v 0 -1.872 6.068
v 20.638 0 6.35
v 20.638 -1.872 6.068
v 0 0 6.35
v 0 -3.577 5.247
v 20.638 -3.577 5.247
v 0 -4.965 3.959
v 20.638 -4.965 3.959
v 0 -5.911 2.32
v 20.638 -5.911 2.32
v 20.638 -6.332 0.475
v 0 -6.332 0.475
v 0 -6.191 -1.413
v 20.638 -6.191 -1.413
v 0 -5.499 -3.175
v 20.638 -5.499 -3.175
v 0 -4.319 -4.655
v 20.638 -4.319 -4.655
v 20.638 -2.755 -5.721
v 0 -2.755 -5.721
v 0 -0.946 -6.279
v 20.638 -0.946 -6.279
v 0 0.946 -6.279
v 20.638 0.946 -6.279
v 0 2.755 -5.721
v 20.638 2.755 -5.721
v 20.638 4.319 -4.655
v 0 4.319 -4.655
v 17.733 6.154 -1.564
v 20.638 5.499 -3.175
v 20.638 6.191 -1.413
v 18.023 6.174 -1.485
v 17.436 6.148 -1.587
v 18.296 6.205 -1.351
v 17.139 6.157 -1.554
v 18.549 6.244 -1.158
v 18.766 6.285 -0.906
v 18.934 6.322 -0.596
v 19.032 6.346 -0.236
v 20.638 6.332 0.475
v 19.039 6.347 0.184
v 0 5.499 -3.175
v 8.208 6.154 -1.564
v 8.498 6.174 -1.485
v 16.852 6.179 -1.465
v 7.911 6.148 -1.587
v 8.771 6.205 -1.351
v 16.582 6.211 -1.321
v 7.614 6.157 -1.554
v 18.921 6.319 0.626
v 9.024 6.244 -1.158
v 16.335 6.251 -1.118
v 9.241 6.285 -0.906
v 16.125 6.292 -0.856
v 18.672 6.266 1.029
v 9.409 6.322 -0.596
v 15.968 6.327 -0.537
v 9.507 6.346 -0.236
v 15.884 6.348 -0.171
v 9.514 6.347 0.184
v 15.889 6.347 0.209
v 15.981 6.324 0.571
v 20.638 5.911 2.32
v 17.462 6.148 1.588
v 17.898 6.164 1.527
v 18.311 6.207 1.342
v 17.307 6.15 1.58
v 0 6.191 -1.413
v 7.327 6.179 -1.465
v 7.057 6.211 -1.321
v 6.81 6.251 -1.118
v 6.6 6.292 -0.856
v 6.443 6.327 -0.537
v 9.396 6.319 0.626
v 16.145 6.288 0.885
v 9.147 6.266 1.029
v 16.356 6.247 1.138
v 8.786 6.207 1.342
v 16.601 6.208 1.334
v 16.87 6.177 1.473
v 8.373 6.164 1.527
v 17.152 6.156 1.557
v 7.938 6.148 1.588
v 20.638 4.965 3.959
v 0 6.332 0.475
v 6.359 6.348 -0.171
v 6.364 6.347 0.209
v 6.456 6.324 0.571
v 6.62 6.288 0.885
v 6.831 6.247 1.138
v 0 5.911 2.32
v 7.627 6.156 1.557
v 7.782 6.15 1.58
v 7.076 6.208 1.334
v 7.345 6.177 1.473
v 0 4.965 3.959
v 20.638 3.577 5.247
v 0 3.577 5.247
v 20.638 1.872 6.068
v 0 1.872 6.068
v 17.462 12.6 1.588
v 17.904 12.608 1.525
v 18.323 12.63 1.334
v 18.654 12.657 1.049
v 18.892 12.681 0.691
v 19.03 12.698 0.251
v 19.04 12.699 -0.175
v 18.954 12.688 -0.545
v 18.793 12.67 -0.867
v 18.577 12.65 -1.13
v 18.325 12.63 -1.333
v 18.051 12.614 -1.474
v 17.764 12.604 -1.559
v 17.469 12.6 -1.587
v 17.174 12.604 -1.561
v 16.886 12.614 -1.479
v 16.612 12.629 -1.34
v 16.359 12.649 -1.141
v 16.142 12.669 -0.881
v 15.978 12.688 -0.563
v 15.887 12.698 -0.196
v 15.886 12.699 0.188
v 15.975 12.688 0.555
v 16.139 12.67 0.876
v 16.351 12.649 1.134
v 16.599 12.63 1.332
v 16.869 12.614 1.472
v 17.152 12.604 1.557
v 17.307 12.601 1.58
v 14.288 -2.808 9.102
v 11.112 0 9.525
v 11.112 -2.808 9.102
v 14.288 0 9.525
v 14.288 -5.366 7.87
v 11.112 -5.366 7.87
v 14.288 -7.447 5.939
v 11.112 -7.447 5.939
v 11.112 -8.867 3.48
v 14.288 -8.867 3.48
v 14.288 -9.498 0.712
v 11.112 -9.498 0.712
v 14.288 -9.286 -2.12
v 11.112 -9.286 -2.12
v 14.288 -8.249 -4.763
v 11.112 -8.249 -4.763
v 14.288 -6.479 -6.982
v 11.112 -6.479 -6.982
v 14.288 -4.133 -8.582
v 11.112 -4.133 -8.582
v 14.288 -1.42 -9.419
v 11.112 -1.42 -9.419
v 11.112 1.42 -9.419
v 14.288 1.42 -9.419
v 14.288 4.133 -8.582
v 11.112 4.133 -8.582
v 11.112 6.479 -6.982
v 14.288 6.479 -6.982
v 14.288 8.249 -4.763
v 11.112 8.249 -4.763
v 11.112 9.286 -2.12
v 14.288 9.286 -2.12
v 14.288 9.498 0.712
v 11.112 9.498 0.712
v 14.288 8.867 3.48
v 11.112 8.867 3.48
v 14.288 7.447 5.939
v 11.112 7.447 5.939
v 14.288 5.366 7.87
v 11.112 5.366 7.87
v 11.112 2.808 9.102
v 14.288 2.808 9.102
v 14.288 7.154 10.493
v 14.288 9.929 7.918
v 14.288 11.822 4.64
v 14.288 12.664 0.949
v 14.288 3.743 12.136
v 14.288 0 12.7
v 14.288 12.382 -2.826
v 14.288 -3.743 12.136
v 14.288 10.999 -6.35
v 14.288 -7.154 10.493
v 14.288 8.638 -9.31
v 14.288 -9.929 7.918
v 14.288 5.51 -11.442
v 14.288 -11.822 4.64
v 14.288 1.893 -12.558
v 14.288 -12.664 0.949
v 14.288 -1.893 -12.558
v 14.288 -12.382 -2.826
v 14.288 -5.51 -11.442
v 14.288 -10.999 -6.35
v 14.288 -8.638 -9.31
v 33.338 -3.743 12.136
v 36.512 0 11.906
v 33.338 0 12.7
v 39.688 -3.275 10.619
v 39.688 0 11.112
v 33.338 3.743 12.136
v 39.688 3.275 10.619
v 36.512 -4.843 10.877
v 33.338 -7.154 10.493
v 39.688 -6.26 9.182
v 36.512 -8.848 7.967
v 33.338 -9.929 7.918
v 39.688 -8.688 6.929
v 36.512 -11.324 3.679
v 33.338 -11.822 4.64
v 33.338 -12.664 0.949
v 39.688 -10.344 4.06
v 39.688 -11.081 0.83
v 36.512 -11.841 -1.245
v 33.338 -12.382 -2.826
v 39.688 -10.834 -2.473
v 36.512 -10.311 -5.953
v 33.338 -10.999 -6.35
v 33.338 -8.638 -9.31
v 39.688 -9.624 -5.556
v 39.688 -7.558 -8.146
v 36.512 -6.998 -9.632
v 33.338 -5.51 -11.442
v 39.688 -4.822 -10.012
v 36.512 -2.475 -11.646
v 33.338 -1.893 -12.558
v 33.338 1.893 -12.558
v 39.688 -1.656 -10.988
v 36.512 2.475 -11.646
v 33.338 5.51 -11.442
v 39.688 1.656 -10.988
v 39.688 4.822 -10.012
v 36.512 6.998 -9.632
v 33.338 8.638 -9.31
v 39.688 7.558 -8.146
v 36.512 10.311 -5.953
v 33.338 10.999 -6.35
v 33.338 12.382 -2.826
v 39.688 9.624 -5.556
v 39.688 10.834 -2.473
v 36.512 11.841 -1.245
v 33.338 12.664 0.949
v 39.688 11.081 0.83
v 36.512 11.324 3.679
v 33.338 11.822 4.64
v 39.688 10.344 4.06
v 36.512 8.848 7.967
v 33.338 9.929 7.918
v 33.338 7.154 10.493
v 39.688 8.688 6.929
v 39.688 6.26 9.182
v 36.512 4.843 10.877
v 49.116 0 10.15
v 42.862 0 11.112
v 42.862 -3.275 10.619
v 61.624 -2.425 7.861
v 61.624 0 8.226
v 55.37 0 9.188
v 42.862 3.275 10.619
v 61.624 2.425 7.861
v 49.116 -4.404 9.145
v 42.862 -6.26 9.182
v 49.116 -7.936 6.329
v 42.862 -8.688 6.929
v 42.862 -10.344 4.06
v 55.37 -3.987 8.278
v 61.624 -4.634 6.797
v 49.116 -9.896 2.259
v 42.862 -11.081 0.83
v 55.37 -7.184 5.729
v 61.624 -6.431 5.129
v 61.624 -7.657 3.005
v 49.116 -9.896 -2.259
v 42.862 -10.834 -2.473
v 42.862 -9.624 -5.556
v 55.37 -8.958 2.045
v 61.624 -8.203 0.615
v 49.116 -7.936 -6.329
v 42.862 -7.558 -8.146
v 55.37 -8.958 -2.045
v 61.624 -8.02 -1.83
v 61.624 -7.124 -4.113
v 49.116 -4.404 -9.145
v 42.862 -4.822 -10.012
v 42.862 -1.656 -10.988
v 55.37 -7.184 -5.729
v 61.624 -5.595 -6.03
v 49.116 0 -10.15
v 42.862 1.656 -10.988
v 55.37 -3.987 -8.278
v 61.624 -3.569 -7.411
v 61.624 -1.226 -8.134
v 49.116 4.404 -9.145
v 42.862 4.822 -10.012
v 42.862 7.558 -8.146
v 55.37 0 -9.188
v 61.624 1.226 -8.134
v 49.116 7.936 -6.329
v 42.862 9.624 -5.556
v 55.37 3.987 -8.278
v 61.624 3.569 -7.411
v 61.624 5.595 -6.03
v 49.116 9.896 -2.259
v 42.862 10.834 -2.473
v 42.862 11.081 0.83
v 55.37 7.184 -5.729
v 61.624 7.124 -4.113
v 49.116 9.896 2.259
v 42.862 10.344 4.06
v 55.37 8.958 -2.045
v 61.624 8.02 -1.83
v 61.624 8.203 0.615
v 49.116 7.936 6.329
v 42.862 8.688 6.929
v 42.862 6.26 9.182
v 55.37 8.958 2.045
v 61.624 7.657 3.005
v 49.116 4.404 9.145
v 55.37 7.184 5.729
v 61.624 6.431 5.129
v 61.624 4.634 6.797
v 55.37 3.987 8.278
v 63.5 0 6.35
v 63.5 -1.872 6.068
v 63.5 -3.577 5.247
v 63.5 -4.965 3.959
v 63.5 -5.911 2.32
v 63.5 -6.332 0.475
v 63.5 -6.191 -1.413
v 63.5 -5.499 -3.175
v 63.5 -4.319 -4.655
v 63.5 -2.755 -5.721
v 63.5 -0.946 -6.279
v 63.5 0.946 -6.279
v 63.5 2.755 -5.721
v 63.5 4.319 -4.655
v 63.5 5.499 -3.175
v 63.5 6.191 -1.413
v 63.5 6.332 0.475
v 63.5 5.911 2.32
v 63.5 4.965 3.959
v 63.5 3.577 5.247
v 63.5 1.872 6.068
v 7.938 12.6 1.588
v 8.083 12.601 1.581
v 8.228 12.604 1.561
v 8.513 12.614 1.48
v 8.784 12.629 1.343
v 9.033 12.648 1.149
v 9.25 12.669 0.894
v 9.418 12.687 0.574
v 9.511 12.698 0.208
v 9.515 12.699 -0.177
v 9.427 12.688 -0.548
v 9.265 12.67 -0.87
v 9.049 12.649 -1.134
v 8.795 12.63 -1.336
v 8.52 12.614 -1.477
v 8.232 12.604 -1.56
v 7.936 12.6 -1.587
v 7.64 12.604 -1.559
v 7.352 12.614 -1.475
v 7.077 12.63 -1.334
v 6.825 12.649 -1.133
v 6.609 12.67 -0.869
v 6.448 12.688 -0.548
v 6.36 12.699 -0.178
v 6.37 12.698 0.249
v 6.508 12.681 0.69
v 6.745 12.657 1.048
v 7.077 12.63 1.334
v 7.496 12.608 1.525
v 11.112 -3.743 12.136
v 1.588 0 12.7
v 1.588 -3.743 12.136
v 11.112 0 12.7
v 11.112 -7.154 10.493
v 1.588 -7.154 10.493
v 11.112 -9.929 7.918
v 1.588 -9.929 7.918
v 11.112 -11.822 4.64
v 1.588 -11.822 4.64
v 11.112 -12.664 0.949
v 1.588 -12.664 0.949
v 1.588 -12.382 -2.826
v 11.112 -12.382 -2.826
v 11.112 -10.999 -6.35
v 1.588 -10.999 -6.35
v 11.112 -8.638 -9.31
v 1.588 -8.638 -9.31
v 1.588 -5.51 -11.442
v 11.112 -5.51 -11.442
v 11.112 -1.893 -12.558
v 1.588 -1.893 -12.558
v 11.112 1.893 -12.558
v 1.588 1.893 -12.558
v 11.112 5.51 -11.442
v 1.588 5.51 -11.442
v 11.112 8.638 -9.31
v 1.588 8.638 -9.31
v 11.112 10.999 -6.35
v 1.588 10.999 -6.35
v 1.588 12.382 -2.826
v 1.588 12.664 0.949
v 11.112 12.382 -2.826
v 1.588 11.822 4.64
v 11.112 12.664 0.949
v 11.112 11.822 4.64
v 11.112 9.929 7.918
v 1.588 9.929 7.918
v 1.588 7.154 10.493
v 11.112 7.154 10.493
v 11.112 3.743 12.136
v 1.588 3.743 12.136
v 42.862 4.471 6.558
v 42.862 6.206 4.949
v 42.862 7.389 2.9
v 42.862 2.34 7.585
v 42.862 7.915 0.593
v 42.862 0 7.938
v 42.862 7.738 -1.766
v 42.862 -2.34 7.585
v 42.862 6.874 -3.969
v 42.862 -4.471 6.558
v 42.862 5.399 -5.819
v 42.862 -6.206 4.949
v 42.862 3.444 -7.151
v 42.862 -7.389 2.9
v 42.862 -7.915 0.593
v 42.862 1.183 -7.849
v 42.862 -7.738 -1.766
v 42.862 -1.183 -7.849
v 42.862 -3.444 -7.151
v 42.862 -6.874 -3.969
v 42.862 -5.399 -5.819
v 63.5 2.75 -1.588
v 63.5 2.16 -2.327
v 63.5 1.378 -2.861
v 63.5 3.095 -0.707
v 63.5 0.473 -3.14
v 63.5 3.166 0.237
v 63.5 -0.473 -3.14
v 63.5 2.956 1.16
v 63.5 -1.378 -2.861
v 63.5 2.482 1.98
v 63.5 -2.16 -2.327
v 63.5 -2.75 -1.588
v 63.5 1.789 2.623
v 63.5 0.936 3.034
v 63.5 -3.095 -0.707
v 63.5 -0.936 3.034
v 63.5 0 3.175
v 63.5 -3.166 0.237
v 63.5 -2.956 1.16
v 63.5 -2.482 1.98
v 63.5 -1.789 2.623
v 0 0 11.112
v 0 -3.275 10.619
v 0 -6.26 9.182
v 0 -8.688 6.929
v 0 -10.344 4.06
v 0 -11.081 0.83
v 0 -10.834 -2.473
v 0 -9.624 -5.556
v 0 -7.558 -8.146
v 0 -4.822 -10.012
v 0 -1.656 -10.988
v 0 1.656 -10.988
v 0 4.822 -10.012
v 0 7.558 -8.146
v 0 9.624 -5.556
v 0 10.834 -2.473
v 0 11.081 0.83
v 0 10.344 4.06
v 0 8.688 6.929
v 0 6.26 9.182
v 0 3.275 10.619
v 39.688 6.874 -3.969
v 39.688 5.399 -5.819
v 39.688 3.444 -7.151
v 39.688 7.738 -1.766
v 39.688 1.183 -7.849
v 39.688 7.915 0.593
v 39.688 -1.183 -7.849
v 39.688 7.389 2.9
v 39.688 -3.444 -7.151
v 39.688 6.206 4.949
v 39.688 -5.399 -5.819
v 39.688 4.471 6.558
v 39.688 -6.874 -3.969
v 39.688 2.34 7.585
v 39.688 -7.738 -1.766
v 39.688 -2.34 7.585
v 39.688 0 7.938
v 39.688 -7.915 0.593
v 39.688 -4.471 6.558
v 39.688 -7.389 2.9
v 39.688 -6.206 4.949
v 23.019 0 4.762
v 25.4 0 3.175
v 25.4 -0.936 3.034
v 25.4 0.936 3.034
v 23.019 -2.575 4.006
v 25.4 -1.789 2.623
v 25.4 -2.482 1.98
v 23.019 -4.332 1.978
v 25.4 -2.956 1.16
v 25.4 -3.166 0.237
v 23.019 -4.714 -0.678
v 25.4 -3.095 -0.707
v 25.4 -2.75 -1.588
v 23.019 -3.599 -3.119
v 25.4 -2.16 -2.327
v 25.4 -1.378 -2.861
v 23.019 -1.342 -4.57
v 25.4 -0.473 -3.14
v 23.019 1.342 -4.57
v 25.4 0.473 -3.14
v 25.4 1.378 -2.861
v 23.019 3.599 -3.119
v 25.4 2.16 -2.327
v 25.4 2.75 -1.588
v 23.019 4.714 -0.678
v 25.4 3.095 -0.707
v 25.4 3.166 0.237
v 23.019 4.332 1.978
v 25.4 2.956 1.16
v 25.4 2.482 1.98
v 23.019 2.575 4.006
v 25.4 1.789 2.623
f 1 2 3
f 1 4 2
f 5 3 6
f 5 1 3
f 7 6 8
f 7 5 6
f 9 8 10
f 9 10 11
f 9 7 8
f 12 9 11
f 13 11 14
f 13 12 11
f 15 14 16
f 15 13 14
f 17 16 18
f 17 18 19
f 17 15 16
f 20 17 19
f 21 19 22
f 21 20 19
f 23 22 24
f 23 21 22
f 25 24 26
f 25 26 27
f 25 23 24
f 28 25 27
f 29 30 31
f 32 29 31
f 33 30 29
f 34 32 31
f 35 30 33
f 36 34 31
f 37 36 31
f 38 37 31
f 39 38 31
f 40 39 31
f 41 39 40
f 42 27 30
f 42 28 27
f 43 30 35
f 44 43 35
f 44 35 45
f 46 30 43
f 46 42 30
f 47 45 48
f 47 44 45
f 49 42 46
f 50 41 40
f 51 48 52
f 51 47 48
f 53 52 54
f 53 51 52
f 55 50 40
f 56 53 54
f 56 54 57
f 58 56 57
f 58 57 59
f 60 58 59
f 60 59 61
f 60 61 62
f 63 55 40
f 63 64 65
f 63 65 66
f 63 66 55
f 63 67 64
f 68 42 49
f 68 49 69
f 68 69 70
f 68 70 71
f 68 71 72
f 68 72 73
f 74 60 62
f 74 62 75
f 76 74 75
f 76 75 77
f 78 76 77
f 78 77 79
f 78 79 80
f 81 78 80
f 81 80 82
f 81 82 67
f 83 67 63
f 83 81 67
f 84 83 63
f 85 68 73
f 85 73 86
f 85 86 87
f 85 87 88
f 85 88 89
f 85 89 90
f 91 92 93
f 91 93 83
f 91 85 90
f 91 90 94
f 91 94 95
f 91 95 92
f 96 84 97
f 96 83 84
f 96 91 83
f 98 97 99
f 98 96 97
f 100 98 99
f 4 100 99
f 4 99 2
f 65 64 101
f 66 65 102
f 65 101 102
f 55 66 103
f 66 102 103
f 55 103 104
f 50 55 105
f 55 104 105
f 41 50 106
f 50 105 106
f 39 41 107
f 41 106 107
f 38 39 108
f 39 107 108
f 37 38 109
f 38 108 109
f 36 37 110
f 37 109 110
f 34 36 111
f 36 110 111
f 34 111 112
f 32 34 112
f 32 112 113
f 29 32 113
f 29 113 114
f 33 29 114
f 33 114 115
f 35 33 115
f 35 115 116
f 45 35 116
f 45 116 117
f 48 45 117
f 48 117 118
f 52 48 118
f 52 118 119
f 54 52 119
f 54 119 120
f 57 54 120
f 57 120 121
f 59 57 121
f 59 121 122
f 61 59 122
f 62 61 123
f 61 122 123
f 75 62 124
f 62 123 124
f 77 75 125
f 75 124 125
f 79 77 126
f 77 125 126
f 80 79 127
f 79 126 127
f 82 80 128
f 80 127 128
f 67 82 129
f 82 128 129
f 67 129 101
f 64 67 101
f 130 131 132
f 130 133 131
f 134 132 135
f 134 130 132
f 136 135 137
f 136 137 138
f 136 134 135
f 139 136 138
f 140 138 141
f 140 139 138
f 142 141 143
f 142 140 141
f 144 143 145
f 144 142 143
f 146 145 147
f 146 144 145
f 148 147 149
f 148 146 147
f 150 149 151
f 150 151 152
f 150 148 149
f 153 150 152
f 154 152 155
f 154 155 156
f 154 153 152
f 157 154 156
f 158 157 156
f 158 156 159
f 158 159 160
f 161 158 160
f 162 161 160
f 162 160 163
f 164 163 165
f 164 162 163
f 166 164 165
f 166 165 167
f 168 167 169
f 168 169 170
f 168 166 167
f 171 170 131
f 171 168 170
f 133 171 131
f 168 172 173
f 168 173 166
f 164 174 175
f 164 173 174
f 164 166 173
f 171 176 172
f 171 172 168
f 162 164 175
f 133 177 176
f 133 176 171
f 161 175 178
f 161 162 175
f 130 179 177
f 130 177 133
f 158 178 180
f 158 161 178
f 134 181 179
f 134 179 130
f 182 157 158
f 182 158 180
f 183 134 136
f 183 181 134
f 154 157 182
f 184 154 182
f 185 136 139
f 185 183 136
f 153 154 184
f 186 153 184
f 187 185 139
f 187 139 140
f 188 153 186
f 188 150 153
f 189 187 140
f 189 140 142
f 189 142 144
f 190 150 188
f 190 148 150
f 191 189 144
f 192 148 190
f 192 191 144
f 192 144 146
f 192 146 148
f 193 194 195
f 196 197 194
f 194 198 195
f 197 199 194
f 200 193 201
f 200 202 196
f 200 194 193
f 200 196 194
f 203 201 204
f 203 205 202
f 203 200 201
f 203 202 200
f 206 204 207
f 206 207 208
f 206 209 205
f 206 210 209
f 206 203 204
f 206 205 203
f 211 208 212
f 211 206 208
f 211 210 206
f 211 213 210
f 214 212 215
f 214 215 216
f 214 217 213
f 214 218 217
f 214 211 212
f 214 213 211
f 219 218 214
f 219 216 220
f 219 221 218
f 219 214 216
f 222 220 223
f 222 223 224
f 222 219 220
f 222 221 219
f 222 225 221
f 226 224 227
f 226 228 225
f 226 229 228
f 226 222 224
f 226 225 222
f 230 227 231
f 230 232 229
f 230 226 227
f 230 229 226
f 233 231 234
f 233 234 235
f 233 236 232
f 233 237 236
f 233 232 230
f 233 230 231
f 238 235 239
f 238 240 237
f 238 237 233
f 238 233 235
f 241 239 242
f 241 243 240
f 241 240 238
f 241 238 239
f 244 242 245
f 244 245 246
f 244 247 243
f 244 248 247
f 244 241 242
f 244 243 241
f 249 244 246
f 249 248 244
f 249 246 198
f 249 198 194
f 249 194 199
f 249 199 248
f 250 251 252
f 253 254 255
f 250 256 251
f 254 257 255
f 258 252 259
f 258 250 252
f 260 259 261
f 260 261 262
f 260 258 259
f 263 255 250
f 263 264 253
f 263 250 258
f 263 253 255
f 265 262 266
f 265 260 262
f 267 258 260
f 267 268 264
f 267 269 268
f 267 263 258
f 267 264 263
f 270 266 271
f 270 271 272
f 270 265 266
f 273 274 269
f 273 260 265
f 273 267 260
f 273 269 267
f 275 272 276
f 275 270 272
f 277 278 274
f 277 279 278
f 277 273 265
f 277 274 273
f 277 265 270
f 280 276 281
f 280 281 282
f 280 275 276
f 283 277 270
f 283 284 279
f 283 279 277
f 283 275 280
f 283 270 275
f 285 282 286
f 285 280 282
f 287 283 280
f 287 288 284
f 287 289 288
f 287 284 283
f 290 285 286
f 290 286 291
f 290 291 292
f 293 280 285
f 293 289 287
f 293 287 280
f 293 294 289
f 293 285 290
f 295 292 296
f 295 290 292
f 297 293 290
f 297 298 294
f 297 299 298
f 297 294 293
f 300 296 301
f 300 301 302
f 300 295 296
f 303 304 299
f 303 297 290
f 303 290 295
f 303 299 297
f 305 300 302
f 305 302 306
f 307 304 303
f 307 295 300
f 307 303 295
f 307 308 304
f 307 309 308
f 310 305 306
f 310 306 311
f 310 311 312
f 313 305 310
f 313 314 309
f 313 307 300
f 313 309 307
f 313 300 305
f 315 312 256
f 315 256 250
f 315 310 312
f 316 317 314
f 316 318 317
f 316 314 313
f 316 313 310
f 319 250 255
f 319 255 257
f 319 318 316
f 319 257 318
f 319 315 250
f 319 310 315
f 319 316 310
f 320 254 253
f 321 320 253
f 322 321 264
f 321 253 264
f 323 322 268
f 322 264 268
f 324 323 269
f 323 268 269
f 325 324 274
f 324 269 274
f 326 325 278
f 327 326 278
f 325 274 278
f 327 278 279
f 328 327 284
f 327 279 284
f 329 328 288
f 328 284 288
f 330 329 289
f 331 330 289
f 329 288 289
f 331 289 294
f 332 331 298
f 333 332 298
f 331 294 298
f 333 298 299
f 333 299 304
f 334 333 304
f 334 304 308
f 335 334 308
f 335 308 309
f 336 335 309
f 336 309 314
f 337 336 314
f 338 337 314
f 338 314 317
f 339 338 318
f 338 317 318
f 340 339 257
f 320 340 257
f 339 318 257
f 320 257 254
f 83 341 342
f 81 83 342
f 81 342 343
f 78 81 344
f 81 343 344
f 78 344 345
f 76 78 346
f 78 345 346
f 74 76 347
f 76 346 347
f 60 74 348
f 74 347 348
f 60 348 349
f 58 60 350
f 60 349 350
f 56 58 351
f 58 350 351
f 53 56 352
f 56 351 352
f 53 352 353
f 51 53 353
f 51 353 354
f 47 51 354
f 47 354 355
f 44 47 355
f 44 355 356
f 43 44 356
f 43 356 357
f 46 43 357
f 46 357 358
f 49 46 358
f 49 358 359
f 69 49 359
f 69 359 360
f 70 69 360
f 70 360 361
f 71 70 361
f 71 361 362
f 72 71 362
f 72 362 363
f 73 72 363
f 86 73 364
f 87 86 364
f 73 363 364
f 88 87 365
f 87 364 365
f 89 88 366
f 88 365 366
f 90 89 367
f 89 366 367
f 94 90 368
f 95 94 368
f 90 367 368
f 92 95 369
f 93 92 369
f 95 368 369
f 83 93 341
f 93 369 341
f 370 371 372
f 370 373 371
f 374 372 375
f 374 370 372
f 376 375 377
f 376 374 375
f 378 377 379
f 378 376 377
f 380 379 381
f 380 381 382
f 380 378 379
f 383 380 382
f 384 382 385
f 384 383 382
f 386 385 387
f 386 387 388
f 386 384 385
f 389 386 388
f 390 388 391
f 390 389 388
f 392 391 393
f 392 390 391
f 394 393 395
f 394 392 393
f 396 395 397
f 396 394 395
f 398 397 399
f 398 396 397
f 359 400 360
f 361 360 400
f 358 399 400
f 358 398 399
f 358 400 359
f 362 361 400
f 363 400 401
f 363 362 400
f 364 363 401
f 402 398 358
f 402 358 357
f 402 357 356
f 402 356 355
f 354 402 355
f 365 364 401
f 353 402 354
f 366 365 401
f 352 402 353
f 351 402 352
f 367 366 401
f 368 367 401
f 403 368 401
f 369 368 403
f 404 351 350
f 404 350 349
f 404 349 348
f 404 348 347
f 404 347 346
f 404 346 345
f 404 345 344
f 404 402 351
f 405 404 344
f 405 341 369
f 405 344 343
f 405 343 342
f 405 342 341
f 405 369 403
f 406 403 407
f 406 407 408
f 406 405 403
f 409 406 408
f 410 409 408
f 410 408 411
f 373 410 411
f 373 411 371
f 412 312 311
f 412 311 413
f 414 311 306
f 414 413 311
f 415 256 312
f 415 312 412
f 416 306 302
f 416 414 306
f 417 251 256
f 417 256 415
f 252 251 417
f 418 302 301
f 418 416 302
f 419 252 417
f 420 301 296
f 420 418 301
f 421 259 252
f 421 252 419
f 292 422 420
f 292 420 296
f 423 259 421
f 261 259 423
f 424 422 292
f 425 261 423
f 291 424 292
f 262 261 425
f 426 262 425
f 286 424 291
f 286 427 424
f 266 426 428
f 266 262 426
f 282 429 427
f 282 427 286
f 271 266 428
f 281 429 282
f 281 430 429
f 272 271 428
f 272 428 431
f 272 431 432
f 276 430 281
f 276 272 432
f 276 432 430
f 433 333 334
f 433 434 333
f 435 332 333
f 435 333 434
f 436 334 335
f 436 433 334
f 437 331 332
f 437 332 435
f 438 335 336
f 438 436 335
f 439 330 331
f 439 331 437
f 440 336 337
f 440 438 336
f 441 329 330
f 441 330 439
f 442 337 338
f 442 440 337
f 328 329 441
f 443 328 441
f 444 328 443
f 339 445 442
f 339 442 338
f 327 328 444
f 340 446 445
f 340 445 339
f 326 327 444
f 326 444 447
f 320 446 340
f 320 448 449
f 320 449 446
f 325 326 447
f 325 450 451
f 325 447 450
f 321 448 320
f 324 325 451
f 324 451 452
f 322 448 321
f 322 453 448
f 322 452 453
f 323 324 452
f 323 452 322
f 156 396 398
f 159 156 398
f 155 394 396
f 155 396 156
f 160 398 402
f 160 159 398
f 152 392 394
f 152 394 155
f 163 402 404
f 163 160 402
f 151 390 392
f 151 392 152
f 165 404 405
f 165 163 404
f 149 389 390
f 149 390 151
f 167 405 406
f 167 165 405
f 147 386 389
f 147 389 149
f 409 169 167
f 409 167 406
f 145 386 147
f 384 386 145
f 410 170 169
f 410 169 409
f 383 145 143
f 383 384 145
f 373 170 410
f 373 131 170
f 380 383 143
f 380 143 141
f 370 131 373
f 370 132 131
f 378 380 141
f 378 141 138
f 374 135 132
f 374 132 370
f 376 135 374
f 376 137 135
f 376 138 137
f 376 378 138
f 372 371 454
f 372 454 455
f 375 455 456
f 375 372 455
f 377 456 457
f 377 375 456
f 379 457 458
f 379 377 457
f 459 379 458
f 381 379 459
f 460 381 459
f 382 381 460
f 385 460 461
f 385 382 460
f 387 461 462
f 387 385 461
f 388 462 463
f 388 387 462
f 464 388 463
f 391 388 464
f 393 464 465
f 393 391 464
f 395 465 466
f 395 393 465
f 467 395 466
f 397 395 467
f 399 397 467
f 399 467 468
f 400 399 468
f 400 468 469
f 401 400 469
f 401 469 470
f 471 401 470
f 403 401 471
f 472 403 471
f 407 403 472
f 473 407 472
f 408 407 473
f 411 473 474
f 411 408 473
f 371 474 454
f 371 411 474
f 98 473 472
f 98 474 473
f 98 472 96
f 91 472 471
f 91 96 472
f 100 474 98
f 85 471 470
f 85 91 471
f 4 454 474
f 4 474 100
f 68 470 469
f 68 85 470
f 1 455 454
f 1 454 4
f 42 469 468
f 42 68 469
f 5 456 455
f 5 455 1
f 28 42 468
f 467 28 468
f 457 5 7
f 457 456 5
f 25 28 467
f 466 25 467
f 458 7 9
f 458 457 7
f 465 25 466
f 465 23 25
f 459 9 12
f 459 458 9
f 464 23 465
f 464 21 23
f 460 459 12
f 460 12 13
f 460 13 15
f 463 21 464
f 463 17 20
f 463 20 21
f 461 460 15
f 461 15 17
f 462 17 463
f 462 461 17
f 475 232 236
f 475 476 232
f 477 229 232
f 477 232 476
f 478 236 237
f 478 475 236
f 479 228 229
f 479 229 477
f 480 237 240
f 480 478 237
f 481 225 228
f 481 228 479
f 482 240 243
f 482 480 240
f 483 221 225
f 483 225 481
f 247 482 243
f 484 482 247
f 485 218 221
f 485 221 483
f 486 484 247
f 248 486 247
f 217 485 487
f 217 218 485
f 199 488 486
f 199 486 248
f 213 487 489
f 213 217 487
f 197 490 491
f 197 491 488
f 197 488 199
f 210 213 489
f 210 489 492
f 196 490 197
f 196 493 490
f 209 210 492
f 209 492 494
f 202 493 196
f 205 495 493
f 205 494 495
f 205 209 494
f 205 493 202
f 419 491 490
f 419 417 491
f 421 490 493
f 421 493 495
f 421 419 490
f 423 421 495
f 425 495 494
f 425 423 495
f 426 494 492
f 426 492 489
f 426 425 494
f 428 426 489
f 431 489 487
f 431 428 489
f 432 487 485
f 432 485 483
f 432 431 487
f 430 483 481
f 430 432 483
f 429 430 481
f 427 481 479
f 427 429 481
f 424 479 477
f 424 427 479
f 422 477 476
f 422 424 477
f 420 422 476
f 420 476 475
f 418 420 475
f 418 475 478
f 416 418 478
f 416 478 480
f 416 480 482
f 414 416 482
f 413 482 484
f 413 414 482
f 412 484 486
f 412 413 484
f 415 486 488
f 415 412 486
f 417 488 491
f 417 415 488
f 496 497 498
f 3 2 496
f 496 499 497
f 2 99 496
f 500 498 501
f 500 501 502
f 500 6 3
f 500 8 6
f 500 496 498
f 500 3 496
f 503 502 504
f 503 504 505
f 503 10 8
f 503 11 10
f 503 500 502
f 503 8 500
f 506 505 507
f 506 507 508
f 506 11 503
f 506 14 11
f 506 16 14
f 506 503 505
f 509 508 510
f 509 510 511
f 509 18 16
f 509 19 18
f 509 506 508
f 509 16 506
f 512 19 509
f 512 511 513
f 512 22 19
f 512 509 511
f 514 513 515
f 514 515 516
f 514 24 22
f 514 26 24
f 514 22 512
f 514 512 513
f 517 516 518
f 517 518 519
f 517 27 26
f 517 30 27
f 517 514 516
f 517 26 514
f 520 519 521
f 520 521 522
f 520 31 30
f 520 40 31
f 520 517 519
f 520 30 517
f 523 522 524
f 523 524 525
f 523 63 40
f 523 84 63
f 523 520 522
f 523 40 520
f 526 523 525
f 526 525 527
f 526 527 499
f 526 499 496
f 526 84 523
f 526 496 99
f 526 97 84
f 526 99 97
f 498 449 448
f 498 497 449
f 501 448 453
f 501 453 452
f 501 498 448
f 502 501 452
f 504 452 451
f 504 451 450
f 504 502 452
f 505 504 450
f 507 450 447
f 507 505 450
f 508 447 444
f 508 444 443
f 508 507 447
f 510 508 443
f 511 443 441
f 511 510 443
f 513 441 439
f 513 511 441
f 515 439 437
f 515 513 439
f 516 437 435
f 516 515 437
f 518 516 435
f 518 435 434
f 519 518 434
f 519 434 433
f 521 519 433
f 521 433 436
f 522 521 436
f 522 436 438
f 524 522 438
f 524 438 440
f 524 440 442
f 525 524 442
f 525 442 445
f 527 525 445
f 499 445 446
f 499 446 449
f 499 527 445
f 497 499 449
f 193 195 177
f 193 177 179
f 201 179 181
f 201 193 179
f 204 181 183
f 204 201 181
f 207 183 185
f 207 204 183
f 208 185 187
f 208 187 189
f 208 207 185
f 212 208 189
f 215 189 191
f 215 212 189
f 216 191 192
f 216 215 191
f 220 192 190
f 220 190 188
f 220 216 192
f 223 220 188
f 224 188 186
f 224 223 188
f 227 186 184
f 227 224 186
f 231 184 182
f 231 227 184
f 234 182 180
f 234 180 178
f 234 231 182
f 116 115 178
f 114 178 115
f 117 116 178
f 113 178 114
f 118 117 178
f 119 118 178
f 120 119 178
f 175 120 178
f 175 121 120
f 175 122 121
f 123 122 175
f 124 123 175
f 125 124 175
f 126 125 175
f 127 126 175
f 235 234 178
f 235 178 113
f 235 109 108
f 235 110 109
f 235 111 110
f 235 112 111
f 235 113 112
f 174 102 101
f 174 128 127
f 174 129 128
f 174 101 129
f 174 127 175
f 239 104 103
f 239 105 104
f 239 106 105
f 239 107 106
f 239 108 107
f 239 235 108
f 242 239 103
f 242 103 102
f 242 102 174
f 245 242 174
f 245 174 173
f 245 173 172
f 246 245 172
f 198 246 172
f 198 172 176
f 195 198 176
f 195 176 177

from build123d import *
from OCP.BRepFilletAPI import BRepFilletAPI_MakeChamfer

# Parameters (mm, degrees)
CHAMFER1_SIZE           = 1.5875
CHAMFER1_SIZE2          = 1.898209315
CUT_EXTRUDE1_REACH      = 71.561
CUT_EXTRUDE1_END_RADIUS = 6.35
SKETCH2_R               = 1.5875


with BuildPart() as part:
    # Sketch1 → Revolve1 (revolve)
    with BuildSketch(Plane.XY, mode=Mode.PRIVATE) as revolve1_sk:
        Polygon((0, 6.35), (0, 12.7), (11.1125, 12.7), (11.1125, 9.525), (14.2875, 9.525), (14.2875, 12.7), (33.3375, 12.7), (39.6875, 11.1125), (39.6875, 7.9375), (42.8625, 7.9375), (42.8625, 11.1125), (63.5, 7.9375), (63.5, 3.175), (25.4, 3.175), (20.6375, 6.35), align=None)
    revolve(revolve1_sk.sketch.rotate(Axis((0, 0, 0), (1, 0, 0)), 90), axis=Axis((0, 0, 0), (1, 0, 0)))

    # Chamfer1: one chamfer whose edges measure the first distance from different faces: ONE call of the kernel's chamfer builder (chamfer() names one face for all edges)
    chamfer1_edges_1 = [part.edges().sort_by_distance(p)[0] for p in [
        (0, 0, -12.7),
    ]]
    chamfer1_edges_2 = [part.edges().sort_by_distance(p)[0] for p in [
        (63.5, 0, -7.9375),
    ]]
    chamfer1_side_2 = [part.faces().sort_by_distance(p)[0] for p in [
        (63.5, 0, -7.712993597),
    ]]
    chamfer1 = BRepFilletAPI_MakeChamfer(part.part.solid().wrapped)
    for e in chamfer1_edges_1:
        chamfer1.Add(CHAMFER1_SIZE, e.wrapped)
    for e in chamfer1_edges_2:
        chamfer1.Add(CHAMFER1_SIZE, CHAMFER1_SIZE2, e.wrapped, chamfer1_side_2[0].wrapped)  # the first distance lies on this face
    add(Compound.cast(chamfer1.Shape()), mode=Mode.REPLACE)

    # Cut-Extrude1: up to this cylinder (the profile starts outside it)
    cut_extrude1_end = Plane(origin=(12.7, 0, 0), z_dir=(-1, 0, 0)) * Cylinder(CUT_EXTRUDE1_END_RADIUS, 166.347, mode=Mode.PRIVATE)
    # Sketch2 → Cut-Extrude1 (cut, up to the surface)
    with BuildSketch(Plane(origin=(0, 12.7, 0), x_dir=(1, 0, 0), z_dir=(0, 1, 0)), mode=Mode.PRIVATE) as cut_extrude1_sk1:
        with Locations(Location((7.9375, 0, 0), (0, 0, 270))):
            Circle(SKETCH2_R)
    cut_extrude1_tool1 = extrude(cut_extrude1_sk1.sketch, amount=-CUT_EXTRUDE1_REACH, mode=Mode.PRIVATE) - cut_extrude1_end
    add(cut_extrude1_tool1.solids().sort_by_distance((7.9375, 12.7, 0))[0], mode=Mode.SUBTRACT)
    # Sketch2 → Cut-Extrude1 (cut, up to the surface)
    with BuildSketch(Plane(origin=(0, 12.7, 0), x_dir=(1, 0, 0), z_dir=(0, 1, 0)), mode=Mode.PRIVATE) as cut_extrude1_sk2:
        with Locations(Location((17.4625, 0, 0), (0, 0, 270))):
            Circle(SKETCH2_R)
    cut_extrude1_tool2 = extrude(cut_extrude1_sk2.sketch, amount=-CUT_EXTRUDE1_REACH, mode=Mode.PRIVATE) - cut_extrude1_end
    add(cut_extrude1_tool2.solids().sort_by_distance((17.4625, 12.7, 0))[0], mode=Mode.SUBTRACT)


solid = part.part
